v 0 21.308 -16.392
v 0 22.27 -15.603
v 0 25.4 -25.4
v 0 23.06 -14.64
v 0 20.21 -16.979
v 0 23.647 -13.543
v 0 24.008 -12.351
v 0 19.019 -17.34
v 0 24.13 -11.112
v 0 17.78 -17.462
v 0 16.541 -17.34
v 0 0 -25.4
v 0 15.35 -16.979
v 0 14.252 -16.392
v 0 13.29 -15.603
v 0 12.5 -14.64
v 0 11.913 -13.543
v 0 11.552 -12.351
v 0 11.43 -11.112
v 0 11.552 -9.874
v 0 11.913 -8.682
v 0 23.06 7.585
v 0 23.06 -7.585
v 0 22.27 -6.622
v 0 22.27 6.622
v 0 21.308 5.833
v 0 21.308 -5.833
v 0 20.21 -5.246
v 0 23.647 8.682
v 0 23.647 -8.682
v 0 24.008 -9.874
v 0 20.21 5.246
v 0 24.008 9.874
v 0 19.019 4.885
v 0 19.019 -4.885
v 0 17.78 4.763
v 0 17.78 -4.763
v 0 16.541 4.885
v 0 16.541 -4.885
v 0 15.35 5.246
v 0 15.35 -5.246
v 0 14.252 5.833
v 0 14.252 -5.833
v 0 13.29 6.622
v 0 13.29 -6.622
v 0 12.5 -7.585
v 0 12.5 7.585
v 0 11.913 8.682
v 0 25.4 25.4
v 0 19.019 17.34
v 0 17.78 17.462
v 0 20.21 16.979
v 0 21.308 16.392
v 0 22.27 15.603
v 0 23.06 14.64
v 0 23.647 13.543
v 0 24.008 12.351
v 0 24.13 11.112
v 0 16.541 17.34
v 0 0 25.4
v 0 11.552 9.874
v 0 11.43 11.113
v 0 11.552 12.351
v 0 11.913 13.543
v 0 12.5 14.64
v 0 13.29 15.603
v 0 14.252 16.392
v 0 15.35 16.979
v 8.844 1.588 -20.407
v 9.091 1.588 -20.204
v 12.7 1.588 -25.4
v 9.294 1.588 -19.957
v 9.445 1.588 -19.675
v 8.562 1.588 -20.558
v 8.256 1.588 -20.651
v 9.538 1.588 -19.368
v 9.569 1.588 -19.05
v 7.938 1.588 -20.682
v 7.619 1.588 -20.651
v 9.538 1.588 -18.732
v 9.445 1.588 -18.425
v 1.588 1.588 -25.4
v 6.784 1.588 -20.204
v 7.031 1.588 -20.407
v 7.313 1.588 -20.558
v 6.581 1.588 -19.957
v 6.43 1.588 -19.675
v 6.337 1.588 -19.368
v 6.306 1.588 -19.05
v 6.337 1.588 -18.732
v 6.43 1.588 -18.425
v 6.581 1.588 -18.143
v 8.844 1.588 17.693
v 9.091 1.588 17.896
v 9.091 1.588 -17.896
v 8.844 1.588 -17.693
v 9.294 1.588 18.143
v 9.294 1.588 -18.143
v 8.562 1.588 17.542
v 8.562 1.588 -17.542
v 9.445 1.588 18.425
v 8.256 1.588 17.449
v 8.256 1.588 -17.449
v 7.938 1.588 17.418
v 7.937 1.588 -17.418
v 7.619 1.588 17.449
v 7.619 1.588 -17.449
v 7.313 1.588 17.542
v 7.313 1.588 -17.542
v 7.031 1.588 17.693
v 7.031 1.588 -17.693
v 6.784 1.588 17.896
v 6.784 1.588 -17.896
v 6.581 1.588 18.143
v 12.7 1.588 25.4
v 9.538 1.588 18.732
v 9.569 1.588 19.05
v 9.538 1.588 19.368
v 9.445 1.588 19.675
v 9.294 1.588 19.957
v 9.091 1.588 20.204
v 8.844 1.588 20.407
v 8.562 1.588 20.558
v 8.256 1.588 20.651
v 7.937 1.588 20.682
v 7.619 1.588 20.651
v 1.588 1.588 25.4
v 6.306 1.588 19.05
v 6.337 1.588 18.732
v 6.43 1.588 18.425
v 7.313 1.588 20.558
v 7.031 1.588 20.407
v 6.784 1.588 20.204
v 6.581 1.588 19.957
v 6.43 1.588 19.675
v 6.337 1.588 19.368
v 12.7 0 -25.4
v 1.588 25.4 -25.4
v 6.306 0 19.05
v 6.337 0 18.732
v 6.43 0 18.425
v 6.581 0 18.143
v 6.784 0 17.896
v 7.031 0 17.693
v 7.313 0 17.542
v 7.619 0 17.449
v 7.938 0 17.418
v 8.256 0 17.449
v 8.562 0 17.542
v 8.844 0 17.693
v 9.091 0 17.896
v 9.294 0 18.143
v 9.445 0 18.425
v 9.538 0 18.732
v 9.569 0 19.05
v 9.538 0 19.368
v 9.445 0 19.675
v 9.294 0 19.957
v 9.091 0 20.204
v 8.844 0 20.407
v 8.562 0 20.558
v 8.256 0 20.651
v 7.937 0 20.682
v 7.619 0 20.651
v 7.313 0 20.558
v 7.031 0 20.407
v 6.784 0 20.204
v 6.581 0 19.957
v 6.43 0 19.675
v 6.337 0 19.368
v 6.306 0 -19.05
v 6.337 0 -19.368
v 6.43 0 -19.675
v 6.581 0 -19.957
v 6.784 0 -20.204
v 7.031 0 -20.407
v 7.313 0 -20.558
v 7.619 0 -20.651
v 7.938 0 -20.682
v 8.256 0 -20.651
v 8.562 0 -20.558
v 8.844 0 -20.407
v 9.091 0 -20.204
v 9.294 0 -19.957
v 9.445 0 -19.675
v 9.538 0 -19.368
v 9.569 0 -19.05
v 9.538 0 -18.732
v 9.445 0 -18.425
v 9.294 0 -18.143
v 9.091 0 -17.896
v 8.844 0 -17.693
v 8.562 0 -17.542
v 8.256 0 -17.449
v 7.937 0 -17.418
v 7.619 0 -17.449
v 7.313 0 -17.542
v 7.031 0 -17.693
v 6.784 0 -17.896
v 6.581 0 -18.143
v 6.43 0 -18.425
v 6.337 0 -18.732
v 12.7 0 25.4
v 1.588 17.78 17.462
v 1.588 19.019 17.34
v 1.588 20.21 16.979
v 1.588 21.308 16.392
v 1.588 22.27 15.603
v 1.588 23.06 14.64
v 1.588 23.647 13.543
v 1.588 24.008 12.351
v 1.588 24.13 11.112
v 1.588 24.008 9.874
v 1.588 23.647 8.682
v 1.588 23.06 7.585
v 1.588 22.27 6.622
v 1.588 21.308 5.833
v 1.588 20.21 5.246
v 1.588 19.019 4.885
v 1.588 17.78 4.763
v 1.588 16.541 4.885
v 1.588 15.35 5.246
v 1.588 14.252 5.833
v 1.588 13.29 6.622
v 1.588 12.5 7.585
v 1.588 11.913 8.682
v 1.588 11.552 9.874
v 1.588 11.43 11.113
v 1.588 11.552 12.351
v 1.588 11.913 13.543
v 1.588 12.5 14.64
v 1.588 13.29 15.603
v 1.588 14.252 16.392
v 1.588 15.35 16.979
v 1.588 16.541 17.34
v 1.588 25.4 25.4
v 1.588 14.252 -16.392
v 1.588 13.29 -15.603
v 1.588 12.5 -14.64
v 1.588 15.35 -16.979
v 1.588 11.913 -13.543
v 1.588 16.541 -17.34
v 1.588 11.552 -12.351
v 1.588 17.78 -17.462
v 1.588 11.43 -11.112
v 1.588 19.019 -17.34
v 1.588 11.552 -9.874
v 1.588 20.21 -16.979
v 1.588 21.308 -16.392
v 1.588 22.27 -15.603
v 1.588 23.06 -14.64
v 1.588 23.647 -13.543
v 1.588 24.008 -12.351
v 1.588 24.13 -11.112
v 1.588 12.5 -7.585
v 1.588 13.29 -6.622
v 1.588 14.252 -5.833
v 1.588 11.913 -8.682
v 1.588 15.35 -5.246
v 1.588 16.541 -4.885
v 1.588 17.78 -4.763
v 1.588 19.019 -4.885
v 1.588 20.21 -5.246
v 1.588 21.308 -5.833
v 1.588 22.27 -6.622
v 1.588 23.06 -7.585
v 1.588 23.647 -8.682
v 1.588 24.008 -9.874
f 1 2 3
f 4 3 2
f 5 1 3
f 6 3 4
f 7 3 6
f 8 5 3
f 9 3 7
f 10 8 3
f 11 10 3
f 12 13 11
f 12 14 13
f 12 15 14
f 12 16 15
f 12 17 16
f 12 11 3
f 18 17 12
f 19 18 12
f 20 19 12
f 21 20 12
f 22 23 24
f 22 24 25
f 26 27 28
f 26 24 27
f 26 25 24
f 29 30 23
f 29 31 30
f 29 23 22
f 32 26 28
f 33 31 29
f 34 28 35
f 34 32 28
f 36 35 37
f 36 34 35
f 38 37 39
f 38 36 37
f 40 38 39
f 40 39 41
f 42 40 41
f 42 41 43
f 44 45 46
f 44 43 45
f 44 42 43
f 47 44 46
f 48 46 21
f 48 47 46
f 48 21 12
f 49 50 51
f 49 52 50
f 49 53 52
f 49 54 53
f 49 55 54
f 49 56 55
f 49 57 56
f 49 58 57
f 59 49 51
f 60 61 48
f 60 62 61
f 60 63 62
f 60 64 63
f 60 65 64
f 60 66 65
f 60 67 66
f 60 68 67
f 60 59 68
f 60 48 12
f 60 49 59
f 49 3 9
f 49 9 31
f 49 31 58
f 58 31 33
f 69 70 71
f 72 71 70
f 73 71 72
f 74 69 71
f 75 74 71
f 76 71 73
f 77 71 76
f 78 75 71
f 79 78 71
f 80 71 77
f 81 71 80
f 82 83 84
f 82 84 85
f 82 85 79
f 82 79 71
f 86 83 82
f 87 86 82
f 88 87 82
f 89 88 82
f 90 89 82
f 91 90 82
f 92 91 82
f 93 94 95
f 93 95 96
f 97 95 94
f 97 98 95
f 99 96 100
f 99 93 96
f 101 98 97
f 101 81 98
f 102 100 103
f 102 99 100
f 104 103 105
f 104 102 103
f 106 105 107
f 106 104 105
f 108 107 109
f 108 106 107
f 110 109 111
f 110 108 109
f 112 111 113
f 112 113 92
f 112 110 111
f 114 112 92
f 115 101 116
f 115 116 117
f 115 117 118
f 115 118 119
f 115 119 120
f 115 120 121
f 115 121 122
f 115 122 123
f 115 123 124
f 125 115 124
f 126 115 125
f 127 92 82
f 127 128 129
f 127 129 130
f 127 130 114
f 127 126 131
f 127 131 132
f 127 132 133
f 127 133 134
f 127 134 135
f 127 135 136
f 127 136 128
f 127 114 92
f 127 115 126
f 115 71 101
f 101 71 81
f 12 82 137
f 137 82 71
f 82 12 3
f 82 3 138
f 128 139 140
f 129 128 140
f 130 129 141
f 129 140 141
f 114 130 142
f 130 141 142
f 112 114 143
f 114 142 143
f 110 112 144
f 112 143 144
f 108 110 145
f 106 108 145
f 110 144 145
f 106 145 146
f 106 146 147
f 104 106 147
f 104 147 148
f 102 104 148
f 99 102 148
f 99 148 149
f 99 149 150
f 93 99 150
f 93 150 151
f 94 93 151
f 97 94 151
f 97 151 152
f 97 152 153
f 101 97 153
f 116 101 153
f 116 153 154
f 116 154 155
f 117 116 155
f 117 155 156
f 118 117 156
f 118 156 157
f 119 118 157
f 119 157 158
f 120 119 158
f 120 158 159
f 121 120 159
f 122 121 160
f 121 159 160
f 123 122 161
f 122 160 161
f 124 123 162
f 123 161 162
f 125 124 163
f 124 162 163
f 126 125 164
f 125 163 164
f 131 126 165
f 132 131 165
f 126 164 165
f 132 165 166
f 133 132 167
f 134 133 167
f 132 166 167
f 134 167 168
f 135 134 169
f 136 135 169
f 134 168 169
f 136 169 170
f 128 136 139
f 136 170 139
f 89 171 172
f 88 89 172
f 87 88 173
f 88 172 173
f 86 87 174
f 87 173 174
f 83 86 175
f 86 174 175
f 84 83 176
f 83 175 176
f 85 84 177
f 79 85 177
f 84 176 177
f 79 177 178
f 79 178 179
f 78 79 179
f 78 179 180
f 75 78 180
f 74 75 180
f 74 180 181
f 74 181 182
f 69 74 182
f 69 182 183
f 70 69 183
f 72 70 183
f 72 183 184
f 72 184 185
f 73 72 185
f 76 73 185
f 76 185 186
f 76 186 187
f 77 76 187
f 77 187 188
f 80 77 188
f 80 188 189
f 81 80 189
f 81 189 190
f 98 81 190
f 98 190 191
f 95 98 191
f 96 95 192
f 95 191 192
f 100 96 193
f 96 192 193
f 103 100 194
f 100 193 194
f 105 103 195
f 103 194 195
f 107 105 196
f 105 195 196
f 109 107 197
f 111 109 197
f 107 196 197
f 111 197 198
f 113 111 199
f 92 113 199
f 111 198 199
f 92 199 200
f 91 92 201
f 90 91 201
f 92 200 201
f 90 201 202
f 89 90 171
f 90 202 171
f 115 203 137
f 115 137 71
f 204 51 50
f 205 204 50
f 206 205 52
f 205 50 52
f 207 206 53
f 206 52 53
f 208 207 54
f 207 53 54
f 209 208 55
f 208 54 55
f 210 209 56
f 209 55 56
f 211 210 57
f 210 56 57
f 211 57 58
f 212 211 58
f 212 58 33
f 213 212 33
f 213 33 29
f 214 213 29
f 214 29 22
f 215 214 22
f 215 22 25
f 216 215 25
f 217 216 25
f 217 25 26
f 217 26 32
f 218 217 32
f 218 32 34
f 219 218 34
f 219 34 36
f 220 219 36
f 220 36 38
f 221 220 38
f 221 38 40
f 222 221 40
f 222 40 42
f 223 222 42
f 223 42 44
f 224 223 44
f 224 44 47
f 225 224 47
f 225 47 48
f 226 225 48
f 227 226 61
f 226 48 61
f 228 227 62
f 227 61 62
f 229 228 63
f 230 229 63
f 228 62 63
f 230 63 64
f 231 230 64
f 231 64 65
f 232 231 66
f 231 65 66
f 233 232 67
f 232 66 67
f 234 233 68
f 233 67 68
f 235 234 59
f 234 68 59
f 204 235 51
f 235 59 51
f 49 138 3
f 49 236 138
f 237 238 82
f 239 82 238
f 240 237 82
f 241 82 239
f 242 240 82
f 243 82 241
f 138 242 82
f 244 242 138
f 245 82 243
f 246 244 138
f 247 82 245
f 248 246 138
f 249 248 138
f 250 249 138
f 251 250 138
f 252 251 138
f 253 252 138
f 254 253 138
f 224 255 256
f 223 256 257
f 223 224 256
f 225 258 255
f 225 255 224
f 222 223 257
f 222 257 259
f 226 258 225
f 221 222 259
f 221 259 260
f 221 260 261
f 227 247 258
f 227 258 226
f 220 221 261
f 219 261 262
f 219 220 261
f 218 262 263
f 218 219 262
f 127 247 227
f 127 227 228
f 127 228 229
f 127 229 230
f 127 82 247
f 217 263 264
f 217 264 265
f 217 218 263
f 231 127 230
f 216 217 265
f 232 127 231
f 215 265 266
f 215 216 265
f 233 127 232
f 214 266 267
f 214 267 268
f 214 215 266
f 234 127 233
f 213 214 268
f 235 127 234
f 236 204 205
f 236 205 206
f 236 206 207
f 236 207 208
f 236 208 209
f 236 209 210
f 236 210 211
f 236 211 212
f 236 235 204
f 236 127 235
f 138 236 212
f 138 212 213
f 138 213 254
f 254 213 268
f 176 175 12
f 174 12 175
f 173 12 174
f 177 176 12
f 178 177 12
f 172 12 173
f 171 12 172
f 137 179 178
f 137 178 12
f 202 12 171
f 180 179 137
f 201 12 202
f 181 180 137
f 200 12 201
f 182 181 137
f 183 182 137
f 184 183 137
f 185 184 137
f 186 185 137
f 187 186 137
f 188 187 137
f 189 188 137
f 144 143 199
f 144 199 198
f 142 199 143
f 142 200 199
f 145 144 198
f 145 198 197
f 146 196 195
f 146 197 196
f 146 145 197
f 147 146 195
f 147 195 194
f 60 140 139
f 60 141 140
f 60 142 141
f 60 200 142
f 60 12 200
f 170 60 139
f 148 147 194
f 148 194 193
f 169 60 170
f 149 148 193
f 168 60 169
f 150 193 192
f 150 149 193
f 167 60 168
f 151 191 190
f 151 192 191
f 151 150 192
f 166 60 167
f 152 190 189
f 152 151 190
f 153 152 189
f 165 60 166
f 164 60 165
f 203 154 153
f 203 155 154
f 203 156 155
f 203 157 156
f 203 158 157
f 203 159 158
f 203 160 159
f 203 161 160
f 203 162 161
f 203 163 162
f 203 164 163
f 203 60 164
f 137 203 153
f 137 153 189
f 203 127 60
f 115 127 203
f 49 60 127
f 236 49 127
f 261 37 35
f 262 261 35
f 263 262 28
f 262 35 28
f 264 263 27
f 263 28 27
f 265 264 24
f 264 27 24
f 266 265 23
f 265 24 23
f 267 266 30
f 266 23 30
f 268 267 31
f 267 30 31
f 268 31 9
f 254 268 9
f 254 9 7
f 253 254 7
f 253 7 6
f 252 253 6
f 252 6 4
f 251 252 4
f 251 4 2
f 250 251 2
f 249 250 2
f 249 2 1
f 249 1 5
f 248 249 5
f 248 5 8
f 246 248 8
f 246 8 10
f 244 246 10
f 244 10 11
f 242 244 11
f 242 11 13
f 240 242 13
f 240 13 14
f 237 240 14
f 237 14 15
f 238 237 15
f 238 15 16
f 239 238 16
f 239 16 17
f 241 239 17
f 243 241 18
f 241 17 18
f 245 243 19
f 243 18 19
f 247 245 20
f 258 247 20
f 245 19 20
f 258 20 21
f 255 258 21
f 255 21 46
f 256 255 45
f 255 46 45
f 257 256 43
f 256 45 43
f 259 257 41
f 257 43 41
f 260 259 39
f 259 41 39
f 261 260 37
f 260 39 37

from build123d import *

# Parameters (mm, degrees)
BOSS_EXTRUDE1_DEPTH       = 25.4
SKETCH3_R                 = 6.35
CUT_EXTRUDE1_DEPTH        = 39.1
F_4_CLEARANCE_HOLE1_D     = 3.2639
F_4_CLEARANCE_HOLE1_DEPTH = 3.175
F_4_CLEARANCE_HOLE1_TIP   = 0.980574487


with BuildPart() as part:
    # Sketch1 → Boss-Extrude1 (new, symmetric)
    with BuildSketch(Plane.XY):
        Polygon((0, 0), (12.7, 0), (12.7, 1.5875), (1.5875, 1.5875), (1.5875, 25.4), (0, 25.4), align=None)
    extrude(amount=BOSS_EXTRUDE1_DEPTH, both=True)

    # Sketch3 → Cut-Extrude1 (cut, through all)
    with BuildSketch(Plane.ZY):
        with Locations((11.1125, 17.78)):
            Circle(SKETCH3_R)
        with Locations((-11.1125, 17.78)):
            Circle(SKETCH3_R)
    extrude(amount=-CUT_EXTRUDE1_DEPTH, mode=Mode.SUBTRACT)

    # #4 Clearance Hole1
    with Locations(Plane(origin=(0, 1.5875, 0), x_dir=(1, 0, 0), z_dir=(0, 1, 0))):
        with Locations((7.9375, 19.05), (7.9375, -19.05)):
            Hole(F_4_CLEARANCE_HOLE1_D / 2, depth=F_4_CLEARANCE_HOLE1_DEPTH)
            with Locations((0, 0, -(F_4_CLEARANCE_HOLE1_DEPTH + F_4_CLEARANCE_HOLE1_TIP / 2))):  # 118° drill point
                Cone(0, F_4_CLEARANCE_HOLE1_D / 2, F_4_CLEARANCE_HOLE1_TIP, mode=Mode.SUBTRACT)


solid = part.part
